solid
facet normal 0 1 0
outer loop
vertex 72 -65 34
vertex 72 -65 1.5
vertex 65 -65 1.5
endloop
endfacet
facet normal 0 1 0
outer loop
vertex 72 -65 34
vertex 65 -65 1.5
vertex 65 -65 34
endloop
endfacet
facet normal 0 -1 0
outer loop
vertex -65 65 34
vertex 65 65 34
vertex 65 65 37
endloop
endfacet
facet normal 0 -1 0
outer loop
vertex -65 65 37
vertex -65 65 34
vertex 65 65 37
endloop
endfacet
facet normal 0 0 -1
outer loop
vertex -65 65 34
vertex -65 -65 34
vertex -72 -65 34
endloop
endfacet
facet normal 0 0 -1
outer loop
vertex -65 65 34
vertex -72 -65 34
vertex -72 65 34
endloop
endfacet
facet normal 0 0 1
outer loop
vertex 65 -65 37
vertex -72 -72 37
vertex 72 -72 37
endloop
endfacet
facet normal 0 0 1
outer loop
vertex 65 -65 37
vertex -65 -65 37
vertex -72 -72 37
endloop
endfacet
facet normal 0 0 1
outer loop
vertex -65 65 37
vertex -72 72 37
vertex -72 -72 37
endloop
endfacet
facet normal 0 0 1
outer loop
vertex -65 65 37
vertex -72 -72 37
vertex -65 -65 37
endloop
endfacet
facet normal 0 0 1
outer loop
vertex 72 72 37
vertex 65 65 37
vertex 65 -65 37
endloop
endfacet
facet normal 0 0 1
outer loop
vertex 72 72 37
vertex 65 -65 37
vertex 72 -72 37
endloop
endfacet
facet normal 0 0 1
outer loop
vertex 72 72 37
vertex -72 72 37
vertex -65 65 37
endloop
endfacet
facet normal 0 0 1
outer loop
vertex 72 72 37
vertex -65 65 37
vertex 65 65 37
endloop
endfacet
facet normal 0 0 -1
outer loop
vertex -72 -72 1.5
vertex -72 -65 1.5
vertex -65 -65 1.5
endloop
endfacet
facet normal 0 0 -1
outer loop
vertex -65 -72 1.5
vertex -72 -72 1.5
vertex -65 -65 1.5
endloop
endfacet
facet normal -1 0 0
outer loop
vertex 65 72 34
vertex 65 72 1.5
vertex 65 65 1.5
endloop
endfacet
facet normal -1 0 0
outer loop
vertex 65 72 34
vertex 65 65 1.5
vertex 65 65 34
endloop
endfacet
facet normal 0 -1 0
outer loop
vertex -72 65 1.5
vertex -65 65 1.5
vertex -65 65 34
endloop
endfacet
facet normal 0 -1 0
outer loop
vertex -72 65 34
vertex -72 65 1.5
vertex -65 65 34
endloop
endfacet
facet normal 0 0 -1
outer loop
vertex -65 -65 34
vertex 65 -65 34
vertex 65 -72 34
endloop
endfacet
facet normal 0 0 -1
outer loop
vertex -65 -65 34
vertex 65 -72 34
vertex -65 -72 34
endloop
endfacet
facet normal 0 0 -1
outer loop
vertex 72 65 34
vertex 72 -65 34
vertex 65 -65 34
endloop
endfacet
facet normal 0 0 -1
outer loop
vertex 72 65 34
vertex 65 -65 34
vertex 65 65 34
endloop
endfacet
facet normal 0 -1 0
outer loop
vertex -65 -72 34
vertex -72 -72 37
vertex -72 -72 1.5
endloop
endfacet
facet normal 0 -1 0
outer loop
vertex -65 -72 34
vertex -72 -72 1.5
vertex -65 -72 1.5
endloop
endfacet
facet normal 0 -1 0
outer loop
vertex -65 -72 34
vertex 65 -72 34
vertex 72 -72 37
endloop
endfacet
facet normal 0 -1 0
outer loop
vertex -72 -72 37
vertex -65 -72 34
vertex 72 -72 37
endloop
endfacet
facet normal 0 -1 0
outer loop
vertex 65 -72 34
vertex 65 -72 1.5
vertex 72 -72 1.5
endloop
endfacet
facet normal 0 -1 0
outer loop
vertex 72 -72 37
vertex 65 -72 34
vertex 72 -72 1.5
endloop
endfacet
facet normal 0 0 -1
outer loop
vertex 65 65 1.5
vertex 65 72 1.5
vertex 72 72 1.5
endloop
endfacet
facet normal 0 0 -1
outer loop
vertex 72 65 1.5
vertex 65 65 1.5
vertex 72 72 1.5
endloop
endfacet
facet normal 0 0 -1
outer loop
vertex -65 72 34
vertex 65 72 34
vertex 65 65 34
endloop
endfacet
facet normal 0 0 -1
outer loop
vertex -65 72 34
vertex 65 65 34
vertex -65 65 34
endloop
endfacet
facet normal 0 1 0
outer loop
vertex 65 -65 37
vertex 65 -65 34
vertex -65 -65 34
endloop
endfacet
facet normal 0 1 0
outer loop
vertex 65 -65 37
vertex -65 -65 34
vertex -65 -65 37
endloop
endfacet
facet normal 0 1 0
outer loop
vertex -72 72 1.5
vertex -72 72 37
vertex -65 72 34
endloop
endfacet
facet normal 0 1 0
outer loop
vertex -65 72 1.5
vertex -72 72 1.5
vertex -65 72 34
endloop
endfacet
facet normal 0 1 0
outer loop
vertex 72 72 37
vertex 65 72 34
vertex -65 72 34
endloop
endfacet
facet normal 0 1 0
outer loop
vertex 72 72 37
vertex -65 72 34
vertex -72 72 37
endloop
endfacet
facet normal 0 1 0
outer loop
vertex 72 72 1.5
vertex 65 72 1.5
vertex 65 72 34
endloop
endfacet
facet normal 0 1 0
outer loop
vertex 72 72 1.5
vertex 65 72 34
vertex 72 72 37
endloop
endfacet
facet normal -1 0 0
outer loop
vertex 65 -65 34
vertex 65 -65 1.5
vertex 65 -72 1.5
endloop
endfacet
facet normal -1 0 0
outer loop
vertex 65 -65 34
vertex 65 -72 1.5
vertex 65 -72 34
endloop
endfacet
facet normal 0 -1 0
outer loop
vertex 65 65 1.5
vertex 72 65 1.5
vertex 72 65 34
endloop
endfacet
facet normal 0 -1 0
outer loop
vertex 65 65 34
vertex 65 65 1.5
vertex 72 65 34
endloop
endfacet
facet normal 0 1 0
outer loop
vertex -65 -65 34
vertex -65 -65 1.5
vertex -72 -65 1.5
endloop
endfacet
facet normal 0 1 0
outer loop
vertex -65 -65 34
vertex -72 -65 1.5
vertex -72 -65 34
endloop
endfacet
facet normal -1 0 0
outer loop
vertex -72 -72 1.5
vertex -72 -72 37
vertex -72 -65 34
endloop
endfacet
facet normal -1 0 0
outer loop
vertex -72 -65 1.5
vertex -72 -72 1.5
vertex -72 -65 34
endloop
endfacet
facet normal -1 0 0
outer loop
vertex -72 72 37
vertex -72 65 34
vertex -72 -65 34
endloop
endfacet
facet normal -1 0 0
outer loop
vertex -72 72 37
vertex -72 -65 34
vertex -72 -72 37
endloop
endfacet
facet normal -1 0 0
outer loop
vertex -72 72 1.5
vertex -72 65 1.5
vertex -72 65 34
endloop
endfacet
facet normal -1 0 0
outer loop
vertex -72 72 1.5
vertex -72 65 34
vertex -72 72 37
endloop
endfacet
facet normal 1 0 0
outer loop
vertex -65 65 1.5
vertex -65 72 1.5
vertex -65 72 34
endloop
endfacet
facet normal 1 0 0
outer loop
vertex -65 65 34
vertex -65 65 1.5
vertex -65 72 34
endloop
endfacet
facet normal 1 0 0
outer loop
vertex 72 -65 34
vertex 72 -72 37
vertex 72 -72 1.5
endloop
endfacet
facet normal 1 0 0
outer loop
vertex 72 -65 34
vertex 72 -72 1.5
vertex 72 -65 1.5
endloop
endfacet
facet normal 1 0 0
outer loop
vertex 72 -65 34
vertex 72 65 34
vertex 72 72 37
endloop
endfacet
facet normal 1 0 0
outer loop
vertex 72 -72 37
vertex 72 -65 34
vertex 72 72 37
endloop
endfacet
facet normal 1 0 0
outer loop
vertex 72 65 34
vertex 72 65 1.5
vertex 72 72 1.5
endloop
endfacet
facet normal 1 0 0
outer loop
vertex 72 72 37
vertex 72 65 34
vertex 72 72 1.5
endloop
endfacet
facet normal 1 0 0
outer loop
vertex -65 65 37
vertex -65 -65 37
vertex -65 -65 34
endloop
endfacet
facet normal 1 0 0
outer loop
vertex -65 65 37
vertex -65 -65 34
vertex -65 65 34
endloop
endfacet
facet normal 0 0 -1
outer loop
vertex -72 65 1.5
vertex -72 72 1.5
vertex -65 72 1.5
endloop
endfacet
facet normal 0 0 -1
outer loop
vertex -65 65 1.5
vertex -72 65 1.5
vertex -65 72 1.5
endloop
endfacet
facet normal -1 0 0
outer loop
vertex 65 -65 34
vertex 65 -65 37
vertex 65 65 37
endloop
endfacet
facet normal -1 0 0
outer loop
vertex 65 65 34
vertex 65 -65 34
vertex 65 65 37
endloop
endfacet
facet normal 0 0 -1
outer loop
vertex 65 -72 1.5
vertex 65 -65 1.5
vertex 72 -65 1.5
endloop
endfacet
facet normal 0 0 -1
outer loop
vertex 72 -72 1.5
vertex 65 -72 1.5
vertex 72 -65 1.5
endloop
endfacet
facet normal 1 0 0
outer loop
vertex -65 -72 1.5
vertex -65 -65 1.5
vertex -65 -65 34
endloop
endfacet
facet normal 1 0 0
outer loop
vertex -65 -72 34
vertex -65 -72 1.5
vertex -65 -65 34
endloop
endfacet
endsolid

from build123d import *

# Parameters (mm, degrees)
SKETCH_W        = 144
SKETCH_H        = 144
PAD_DEPTH       = 37
SKETCH001_W     = 130
SKETCH001_H     = 130
POCKET_DEPTH    = 37.001
SKETCH002_W     = 130
SKETCH002_H     = 34
POCKET001_DEPTH = 144.001
SKETCH003_W     = 130
SKETCH003_H     = 34
POCKET002_DEPTH = 144.001
SKETCH004_W     = 144
SKETCH004_H     = 144
POCKET003_DEPTH = 1.5


with BuildPart() as part:
    # Sketch → Pad (new body)
    with BuildSketch(Plane.XY):
        Rectangle(SKETCH_W, SKETCH_H)
    extrude(amount=PAD_DEPTH)

    # Sketch001 (on Face6 of Pad) → Pocket (cut, through all)
    with BuildSketch(Plane.XY.offset(37)):
        Rectangle(SKETCH001_W, SKETCH001_H)
    extrude(amount=-POCKET_DEPTH, mode=Mode.SUBTRACT)

    # Sketch002 (on Face3 of Pocket) → Pocket001 (cut, through all)
    with BuildSketch(Plane.YZ.offset(72)):
        with Locations((0, 17)):
            Rectangle(SKETCH002_W, SKETCH002_H)
    extrude(amount=-POCKET001_DEPTH, mode=Mode.SUBTRACT)

    # Sketch003 (on Face8 of Pocket001) → Pocket002 (cut, through all)
    with BuildSketch(Plane(origin=(0, 72, 0), x_dir=(-1, 0, 0), z_dir=(0, 1, 0))):
        with Locations((0, 17)):
            Rectangle(SKETCH003_W, SKETCH003_H)
    extrude(amount=-POCKET002_DEPTH, mode=Mode.SUBTRACT)

    # Sketch004 → Pocket003 (cut, symmetric)
    with BuildSketch(Plane.XY):
        Rectangle(SKETCH004_W, SKETCH004_H)
    extrude(amount=POCKET003_DEPTH, both=True, mode=Mode.SUBTRACT)


solid = part.part
